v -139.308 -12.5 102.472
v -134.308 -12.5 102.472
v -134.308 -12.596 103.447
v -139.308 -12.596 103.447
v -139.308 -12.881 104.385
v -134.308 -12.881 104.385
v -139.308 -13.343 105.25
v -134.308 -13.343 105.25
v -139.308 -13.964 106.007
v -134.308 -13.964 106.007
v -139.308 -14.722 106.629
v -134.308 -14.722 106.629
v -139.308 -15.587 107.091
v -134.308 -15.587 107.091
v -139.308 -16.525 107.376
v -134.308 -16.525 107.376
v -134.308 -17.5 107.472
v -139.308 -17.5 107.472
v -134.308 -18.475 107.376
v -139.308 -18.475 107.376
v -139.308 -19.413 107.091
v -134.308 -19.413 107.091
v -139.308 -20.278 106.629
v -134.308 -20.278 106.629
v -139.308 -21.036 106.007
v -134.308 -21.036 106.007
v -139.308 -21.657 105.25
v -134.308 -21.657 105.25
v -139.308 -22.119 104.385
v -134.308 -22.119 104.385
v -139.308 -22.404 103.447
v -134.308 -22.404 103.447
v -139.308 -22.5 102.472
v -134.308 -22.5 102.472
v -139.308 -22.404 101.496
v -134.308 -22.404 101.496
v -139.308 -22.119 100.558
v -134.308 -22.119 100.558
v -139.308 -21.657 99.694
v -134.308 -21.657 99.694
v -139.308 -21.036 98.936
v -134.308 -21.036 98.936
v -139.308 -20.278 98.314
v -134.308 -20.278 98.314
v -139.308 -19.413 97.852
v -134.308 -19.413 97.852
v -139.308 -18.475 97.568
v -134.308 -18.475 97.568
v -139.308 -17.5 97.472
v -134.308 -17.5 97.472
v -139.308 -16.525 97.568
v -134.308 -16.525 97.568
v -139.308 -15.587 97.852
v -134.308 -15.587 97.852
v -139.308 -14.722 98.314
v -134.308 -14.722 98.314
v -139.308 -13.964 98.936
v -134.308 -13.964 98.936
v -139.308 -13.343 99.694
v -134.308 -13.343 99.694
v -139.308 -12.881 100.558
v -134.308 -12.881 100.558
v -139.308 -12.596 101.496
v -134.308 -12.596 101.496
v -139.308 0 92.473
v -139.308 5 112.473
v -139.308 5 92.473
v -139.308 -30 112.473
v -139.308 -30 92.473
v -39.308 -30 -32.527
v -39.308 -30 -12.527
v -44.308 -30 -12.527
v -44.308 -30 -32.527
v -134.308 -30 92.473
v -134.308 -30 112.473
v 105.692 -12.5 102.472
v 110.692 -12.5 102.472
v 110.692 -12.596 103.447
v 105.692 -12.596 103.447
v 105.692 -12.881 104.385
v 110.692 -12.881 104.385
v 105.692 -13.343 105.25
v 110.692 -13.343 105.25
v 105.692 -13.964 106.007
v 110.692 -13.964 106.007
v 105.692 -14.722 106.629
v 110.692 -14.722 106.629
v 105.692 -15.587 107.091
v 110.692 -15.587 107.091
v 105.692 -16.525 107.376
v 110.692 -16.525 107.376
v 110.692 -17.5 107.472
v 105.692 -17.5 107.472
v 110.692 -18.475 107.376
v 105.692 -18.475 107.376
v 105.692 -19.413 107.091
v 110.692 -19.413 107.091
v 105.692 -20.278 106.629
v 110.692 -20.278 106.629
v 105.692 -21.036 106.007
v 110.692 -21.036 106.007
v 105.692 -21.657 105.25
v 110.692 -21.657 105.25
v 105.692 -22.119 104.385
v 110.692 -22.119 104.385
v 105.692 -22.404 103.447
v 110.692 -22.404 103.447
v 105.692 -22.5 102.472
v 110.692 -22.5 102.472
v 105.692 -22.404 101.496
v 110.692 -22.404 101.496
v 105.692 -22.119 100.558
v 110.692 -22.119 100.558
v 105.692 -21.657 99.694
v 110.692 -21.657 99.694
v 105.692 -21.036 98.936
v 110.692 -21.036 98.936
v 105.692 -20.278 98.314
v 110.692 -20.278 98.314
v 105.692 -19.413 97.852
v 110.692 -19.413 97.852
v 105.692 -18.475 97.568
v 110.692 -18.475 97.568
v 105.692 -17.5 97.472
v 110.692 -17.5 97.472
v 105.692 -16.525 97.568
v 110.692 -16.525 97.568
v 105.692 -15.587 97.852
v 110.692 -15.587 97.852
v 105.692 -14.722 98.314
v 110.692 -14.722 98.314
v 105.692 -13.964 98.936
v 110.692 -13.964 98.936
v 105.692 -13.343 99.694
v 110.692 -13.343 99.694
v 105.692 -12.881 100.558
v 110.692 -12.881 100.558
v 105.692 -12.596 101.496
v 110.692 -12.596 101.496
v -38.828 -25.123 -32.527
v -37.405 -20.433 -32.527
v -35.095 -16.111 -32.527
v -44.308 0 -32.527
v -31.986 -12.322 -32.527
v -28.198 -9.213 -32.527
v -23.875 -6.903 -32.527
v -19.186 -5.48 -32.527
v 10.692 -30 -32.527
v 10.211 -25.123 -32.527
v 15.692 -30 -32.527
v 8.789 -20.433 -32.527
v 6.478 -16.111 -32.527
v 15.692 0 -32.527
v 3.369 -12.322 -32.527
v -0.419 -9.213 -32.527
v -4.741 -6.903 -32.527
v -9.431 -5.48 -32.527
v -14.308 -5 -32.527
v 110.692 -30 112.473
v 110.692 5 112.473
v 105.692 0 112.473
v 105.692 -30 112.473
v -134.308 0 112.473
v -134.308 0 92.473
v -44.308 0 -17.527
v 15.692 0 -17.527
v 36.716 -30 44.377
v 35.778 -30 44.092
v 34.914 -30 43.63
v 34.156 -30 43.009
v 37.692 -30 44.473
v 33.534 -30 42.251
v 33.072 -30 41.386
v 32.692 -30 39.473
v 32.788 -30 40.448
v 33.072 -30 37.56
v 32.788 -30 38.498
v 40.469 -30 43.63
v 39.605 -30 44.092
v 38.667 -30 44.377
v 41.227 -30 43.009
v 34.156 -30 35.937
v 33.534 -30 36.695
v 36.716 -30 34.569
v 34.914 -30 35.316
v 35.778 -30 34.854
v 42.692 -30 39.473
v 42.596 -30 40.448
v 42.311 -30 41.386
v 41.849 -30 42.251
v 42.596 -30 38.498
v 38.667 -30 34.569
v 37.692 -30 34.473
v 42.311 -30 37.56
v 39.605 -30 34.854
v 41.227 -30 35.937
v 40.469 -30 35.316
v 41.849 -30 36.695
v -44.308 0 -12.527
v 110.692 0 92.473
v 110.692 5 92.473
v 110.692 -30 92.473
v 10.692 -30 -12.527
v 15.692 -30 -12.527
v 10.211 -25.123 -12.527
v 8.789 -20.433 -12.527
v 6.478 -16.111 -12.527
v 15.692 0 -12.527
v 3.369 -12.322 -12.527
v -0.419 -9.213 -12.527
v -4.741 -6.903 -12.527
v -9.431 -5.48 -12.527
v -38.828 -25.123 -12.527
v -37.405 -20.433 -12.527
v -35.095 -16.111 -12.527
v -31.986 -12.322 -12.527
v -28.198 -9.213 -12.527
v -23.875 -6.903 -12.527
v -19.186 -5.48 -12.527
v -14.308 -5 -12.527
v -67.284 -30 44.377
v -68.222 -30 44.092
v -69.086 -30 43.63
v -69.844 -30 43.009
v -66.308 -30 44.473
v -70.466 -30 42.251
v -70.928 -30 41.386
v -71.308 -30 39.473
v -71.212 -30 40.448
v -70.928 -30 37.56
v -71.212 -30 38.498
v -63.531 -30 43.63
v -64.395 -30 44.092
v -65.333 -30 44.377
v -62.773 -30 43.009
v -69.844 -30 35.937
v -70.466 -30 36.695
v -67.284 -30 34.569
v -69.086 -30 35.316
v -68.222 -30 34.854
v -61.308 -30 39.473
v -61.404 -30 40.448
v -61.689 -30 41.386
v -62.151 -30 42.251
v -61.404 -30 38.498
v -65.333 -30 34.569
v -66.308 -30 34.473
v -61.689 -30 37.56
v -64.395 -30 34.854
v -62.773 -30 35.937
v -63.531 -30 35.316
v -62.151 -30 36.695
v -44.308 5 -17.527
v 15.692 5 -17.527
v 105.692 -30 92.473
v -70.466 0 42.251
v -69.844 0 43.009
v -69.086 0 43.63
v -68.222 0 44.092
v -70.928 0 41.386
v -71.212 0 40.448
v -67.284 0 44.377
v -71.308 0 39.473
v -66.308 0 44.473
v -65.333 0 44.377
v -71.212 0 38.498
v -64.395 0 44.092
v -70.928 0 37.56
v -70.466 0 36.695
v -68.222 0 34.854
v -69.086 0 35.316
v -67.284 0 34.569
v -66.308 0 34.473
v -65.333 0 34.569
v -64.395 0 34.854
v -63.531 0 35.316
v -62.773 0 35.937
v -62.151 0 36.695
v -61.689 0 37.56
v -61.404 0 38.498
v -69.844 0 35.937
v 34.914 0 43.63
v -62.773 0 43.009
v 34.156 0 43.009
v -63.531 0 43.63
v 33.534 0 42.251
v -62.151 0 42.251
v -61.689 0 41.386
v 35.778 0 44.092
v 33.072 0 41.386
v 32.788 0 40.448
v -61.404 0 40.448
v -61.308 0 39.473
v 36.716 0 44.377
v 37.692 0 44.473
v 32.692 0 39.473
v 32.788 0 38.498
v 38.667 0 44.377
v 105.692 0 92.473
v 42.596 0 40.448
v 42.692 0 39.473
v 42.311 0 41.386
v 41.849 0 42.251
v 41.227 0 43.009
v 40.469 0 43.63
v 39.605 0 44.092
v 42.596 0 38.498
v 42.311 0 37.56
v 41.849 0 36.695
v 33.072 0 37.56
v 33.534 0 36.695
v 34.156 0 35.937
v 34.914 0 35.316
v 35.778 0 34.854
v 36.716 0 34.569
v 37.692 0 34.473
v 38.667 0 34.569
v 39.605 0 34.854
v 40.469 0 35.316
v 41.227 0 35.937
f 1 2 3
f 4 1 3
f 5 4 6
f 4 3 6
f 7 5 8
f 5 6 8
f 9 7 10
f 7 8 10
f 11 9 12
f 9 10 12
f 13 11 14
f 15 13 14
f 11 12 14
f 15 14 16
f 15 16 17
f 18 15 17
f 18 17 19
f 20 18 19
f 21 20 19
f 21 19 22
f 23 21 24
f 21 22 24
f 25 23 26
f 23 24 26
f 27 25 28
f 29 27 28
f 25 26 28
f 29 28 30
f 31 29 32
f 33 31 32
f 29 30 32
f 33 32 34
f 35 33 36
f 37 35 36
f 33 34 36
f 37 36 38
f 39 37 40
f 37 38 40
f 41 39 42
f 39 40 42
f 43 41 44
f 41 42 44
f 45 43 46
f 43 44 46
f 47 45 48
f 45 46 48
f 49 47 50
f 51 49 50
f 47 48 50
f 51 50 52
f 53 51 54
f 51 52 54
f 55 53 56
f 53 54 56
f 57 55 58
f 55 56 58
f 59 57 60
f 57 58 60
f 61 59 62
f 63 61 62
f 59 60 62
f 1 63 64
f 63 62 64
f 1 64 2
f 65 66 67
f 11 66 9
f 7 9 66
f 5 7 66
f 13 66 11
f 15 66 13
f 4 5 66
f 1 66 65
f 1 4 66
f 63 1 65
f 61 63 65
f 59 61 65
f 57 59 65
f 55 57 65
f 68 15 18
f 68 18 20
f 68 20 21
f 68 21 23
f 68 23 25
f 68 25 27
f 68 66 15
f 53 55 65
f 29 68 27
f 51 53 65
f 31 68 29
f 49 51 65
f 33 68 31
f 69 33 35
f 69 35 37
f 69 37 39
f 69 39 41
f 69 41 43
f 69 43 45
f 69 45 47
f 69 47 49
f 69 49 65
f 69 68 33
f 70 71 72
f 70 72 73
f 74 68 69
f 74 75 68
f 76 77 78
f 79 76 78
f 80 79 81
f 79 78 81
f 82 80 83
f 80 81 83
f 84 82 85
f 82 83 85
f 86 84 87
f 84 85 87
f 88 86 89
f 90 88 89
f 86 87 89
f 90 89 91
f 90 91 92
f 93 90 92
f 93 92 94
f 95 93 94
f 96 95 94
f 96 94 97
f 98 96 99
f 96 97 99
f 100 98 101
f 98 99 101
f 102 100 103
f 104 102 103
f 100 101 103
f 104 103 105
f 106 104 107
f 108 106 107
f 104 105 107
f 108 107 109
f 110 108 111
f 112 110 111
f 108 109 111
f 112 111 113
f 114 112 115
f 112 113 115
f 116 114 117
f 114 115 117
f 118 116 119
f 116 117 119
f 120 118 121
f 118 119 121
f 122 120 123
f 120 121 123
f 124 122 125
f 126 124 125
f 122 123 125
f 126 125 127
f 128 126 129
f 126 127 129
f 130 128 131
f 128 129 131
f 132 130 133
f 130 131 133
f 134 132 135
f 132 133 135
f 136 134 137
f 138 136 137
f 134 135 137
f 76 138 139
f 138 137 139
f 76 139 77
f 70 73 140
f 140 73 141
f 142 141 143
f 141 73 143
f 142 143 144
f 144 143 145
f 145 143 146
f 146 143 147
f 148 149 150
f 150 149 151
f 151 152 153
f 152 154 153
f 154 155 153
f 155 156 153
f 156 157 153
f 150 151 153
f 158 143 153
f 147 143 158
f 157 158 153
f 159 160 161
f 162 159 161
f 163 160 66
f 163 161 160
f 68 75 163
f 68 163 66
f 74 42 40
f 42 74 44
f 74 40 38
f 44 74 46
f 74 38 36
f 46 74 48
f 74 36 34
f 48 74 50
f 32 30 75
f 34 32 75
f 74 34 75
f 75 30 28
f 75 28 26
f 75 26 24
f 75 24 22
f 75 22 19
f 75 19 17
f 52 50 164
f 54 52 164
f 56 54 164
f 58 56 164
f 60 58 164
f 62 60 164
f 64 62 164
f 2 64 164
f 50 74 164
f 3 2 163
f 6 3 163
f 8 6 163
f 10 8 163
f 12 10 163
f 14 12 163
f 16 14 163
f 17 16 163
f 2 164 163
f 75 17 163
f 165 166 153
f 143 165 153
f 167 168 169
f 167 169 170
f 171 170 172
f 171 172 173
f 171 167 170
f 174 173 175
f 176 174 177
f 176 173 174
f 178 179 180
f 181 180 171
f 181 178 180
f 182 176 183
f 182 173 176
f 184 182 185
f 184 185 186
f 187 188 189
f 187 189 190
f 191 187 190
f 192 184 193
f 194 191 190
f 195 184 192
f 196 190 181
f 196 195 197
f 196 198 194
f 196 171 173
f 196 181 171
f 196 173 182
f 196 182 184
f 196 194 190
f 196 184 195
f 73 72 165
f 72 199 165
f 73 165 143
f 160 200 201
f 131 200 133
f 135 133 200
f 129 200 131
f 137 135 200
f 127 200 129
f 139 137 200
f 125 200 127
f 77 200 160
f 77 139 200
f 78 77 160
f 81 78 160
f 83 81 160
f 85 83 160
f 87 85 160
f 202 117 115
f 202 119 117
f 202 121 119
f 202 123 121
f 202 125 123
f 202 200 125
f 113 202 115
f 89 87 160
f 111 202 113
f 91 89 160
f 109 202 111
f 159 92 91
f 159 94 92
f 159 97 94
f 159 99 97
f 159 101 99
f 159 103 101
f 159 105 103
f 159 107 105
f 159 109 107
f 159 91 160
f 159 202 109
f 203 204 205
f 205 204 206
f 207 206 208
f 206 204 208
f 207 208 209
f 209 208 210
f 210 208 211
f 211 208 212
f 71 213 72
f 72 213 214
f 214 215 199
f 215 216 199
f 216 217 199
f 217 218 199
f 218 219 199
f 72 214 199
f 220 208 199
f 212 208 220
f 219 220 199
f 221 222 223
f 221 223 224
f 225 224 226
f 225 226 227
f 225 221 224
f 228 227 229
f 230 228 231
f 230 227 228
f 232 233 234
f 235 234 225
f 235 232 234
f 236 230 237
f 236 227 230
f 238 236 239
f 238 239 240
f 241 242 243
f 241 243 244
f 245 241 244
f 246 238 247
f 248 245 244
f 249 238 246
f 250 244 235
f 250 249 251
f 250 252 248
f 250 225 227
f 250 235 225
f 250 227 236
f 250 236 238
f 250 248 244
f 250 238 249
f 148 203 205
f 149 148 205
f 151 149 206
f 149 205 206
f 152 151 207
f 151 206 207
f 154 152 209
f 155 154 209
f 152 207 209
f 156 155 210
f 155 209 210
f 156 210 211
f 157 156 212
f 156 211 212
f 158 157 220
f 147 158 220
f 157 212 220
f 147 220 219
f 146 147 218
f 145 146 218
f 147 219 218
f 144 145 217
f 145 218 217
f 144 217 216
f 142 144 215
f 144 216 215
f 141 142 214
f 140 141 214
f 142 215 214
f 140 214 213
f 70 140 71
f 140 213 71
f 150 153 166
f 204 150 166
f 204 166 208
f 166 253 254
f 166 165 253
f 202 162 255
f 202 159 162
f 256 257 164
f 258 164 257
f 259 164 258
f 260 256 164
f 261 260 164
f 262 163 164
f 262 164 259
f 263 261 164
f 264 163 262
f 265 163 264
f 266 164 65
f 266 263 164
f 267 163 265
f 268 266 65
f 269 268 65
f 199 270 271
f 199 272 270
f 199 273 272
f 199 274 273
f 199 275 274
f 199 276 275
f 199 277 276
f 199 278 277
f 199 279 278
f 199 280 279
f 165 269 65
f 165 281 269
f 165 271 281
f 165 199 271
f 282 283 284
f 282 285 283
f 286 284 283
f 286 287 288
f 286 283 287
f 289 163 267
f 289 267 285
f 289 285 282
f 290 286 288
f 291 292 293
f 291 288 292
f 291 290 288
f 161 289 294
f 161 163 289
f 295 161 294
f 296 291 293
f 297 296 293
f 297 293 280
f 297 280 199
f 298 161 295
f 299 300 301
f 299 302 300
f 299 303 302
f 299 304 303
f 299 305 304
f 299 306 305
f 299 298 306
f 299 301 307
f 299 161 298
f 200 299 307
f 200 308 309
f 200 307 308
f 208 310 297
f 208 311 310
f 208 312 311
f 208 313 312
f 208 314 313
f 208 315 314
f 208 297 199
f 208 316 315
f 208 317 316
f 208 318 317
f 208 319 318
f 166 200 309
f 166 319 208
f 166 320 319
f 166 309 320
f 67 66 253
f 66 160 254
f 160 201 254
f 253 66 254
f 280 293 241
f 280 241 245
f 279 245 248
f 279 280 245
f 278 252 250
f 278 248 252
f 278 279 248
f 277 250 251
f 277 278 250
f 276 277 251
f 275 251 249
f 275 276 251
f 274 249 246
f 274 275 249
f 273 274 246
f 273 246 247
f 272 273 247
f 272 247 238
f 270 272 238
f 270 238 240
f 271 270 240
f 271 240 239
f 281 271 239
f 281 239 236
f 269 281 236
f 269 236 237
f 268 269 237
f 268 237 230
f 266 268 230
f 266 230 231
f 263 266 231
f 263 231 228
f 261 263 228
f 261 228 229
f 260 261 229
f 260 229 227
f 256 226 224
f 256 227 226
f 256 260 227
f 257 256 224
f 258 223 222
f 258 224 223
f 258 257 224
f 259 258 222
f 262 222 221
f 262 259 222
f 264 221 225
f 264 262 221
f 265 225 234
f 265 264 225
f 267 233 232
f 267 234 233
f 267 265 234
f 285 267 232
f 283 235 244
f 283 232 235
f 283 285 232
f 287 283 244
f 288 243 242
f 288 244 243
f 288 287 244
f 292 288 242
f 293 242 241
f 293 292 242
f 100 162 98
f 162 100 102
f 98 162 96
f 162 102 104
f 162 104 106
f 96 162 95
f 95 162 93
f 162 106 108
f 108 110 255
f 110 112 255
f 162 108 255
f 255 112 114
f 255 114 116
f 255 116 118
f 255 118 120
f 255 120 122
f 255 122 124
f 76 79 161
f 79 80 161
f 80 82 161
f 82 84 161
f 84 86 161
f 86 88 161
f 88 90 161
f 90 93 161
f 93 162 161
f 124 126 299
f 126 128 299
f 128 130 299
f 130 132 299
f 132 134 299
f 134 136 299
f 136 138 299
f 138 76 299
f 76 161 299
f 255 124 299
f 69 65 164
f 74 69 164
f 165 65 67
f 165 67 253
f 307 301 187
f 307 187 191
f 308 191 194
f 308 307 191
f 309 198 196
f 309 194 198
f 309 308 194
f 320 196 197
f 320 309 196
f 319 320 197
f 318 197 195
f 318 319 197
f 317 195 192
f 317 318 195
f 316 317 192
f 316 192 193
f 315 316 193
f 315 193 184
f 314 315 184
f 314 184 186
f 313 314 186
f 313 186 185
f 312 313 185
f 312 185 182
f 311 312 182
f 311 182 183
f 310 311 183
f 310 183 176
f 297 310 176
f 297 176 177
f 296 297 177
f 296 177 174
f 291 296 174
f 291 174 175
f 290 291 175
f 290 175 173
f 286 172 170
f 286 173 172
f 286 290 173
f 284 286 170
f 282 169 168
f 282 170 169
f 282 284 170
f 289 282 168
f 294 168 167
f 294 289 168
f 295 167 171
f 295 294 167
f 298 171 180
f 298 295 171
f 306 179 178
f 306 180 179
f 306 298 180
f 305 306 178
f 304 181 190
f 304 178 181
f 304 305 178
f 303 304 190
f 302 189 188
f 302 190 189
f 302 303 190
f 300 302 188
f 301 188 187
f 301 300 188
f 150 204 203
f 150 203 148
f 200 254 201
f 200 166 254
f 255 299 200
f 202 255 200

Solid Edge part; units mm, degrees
sketch "Sketch1" plane through (0, 0, 0) normal (0, -1, 0) x (1, 0, 0)
  line L0 (110.6916, 92.473) -> (110.6916, 112.473)
  line L1 (110.6916, 112.473) -> (-139.3084, 112.473)
  line L2 (-139.3084, 112.473) -> (-139.3084, 92.473)
  line L3 (-139.3084, 92.473) -> (-44.3084, -17.527)
  line L4 (-44.3084, -17.527) -> (15.6916, -17.527)
  line L5 (15.6916, -17.527) -> (110.6916, 92.473)
  dimension "D1" = 20
  dimension "D2" = 250
  dimension "D3" = 60
  dimension "D4" = 130
  dimension "D5" = 20
extrude "ExtrudedProtrusion_1" add sketch "Sketch1" against normal blind 5
sketch "Sketch2" plane through (10.6916, 0, 44.973) normal (0, -1, 0) x (1, 0, 0)
  line L0 (95, 47.5) -> (100, 47.5)
  line L1 (100, 47.5) -> (100, 67.5)
  line L2 (100, 67.5) -> (95, 67.5)
  line L3 (95, 67.5) -> (95, 47.5)
  line L4 (-55, -77.5) -> (5, -77.5)
  line L5 (5, -77.5) -> (5, -57.5)
  line L6 (5, -57.5) -> (-55, -57.5)
  line L7 (-55, -57.5) -> (-55, -77.5)
  circle A0 centre (-77, -5.5) radius 5
  circle A1 centre (27, -5.5) radius 5
  line L8 (-150, 47.5) -> (-145, 47.5)
  line L9 (-145, 47.5) -> (-145, 67.5)
  line L10 (-145, 67.5) -> (-150, 67.5)
  line L11 (-150, 67.5) -> (-150, 47.5)
  dimension "D1" = 20
  dimension "D2" = 5
  dimension "D3" = 5
  dimension "D4" = 20
  dimension "D5" = 5
  dimension "D6" = 20
  dimension "D7" = 60
  dimension "D8" = 15
  dimension "D9" = 10
  dimension "D10" = 10
  dimension "D11" = 52
  dimension "D12" = 52
  dimension "D13" = 52
extrude "Protrusion1" add sketch "Sketch2" along normal blind 30
sketch "Sketch3" plane through (-14.3084, -50, 24.202) normal (0, 0, 1) x (0, 1, 0)
  circle A0 centre (20, 0) radius 25
  dimension "D1" = 50
extrude "Cutout1" cut sketch "Sketch3" against normal through all
sketch "Sketch4" plane through (160.6916, -12.5, 96.702) normal (1, 0, 0) x (0, 1, 0)
  circle A0 centre (-5, 5.7698) radius 5
  dimension "D1" = 12.5
extrude "Cutout2" cut sketch "Sketch4" against normal through all
